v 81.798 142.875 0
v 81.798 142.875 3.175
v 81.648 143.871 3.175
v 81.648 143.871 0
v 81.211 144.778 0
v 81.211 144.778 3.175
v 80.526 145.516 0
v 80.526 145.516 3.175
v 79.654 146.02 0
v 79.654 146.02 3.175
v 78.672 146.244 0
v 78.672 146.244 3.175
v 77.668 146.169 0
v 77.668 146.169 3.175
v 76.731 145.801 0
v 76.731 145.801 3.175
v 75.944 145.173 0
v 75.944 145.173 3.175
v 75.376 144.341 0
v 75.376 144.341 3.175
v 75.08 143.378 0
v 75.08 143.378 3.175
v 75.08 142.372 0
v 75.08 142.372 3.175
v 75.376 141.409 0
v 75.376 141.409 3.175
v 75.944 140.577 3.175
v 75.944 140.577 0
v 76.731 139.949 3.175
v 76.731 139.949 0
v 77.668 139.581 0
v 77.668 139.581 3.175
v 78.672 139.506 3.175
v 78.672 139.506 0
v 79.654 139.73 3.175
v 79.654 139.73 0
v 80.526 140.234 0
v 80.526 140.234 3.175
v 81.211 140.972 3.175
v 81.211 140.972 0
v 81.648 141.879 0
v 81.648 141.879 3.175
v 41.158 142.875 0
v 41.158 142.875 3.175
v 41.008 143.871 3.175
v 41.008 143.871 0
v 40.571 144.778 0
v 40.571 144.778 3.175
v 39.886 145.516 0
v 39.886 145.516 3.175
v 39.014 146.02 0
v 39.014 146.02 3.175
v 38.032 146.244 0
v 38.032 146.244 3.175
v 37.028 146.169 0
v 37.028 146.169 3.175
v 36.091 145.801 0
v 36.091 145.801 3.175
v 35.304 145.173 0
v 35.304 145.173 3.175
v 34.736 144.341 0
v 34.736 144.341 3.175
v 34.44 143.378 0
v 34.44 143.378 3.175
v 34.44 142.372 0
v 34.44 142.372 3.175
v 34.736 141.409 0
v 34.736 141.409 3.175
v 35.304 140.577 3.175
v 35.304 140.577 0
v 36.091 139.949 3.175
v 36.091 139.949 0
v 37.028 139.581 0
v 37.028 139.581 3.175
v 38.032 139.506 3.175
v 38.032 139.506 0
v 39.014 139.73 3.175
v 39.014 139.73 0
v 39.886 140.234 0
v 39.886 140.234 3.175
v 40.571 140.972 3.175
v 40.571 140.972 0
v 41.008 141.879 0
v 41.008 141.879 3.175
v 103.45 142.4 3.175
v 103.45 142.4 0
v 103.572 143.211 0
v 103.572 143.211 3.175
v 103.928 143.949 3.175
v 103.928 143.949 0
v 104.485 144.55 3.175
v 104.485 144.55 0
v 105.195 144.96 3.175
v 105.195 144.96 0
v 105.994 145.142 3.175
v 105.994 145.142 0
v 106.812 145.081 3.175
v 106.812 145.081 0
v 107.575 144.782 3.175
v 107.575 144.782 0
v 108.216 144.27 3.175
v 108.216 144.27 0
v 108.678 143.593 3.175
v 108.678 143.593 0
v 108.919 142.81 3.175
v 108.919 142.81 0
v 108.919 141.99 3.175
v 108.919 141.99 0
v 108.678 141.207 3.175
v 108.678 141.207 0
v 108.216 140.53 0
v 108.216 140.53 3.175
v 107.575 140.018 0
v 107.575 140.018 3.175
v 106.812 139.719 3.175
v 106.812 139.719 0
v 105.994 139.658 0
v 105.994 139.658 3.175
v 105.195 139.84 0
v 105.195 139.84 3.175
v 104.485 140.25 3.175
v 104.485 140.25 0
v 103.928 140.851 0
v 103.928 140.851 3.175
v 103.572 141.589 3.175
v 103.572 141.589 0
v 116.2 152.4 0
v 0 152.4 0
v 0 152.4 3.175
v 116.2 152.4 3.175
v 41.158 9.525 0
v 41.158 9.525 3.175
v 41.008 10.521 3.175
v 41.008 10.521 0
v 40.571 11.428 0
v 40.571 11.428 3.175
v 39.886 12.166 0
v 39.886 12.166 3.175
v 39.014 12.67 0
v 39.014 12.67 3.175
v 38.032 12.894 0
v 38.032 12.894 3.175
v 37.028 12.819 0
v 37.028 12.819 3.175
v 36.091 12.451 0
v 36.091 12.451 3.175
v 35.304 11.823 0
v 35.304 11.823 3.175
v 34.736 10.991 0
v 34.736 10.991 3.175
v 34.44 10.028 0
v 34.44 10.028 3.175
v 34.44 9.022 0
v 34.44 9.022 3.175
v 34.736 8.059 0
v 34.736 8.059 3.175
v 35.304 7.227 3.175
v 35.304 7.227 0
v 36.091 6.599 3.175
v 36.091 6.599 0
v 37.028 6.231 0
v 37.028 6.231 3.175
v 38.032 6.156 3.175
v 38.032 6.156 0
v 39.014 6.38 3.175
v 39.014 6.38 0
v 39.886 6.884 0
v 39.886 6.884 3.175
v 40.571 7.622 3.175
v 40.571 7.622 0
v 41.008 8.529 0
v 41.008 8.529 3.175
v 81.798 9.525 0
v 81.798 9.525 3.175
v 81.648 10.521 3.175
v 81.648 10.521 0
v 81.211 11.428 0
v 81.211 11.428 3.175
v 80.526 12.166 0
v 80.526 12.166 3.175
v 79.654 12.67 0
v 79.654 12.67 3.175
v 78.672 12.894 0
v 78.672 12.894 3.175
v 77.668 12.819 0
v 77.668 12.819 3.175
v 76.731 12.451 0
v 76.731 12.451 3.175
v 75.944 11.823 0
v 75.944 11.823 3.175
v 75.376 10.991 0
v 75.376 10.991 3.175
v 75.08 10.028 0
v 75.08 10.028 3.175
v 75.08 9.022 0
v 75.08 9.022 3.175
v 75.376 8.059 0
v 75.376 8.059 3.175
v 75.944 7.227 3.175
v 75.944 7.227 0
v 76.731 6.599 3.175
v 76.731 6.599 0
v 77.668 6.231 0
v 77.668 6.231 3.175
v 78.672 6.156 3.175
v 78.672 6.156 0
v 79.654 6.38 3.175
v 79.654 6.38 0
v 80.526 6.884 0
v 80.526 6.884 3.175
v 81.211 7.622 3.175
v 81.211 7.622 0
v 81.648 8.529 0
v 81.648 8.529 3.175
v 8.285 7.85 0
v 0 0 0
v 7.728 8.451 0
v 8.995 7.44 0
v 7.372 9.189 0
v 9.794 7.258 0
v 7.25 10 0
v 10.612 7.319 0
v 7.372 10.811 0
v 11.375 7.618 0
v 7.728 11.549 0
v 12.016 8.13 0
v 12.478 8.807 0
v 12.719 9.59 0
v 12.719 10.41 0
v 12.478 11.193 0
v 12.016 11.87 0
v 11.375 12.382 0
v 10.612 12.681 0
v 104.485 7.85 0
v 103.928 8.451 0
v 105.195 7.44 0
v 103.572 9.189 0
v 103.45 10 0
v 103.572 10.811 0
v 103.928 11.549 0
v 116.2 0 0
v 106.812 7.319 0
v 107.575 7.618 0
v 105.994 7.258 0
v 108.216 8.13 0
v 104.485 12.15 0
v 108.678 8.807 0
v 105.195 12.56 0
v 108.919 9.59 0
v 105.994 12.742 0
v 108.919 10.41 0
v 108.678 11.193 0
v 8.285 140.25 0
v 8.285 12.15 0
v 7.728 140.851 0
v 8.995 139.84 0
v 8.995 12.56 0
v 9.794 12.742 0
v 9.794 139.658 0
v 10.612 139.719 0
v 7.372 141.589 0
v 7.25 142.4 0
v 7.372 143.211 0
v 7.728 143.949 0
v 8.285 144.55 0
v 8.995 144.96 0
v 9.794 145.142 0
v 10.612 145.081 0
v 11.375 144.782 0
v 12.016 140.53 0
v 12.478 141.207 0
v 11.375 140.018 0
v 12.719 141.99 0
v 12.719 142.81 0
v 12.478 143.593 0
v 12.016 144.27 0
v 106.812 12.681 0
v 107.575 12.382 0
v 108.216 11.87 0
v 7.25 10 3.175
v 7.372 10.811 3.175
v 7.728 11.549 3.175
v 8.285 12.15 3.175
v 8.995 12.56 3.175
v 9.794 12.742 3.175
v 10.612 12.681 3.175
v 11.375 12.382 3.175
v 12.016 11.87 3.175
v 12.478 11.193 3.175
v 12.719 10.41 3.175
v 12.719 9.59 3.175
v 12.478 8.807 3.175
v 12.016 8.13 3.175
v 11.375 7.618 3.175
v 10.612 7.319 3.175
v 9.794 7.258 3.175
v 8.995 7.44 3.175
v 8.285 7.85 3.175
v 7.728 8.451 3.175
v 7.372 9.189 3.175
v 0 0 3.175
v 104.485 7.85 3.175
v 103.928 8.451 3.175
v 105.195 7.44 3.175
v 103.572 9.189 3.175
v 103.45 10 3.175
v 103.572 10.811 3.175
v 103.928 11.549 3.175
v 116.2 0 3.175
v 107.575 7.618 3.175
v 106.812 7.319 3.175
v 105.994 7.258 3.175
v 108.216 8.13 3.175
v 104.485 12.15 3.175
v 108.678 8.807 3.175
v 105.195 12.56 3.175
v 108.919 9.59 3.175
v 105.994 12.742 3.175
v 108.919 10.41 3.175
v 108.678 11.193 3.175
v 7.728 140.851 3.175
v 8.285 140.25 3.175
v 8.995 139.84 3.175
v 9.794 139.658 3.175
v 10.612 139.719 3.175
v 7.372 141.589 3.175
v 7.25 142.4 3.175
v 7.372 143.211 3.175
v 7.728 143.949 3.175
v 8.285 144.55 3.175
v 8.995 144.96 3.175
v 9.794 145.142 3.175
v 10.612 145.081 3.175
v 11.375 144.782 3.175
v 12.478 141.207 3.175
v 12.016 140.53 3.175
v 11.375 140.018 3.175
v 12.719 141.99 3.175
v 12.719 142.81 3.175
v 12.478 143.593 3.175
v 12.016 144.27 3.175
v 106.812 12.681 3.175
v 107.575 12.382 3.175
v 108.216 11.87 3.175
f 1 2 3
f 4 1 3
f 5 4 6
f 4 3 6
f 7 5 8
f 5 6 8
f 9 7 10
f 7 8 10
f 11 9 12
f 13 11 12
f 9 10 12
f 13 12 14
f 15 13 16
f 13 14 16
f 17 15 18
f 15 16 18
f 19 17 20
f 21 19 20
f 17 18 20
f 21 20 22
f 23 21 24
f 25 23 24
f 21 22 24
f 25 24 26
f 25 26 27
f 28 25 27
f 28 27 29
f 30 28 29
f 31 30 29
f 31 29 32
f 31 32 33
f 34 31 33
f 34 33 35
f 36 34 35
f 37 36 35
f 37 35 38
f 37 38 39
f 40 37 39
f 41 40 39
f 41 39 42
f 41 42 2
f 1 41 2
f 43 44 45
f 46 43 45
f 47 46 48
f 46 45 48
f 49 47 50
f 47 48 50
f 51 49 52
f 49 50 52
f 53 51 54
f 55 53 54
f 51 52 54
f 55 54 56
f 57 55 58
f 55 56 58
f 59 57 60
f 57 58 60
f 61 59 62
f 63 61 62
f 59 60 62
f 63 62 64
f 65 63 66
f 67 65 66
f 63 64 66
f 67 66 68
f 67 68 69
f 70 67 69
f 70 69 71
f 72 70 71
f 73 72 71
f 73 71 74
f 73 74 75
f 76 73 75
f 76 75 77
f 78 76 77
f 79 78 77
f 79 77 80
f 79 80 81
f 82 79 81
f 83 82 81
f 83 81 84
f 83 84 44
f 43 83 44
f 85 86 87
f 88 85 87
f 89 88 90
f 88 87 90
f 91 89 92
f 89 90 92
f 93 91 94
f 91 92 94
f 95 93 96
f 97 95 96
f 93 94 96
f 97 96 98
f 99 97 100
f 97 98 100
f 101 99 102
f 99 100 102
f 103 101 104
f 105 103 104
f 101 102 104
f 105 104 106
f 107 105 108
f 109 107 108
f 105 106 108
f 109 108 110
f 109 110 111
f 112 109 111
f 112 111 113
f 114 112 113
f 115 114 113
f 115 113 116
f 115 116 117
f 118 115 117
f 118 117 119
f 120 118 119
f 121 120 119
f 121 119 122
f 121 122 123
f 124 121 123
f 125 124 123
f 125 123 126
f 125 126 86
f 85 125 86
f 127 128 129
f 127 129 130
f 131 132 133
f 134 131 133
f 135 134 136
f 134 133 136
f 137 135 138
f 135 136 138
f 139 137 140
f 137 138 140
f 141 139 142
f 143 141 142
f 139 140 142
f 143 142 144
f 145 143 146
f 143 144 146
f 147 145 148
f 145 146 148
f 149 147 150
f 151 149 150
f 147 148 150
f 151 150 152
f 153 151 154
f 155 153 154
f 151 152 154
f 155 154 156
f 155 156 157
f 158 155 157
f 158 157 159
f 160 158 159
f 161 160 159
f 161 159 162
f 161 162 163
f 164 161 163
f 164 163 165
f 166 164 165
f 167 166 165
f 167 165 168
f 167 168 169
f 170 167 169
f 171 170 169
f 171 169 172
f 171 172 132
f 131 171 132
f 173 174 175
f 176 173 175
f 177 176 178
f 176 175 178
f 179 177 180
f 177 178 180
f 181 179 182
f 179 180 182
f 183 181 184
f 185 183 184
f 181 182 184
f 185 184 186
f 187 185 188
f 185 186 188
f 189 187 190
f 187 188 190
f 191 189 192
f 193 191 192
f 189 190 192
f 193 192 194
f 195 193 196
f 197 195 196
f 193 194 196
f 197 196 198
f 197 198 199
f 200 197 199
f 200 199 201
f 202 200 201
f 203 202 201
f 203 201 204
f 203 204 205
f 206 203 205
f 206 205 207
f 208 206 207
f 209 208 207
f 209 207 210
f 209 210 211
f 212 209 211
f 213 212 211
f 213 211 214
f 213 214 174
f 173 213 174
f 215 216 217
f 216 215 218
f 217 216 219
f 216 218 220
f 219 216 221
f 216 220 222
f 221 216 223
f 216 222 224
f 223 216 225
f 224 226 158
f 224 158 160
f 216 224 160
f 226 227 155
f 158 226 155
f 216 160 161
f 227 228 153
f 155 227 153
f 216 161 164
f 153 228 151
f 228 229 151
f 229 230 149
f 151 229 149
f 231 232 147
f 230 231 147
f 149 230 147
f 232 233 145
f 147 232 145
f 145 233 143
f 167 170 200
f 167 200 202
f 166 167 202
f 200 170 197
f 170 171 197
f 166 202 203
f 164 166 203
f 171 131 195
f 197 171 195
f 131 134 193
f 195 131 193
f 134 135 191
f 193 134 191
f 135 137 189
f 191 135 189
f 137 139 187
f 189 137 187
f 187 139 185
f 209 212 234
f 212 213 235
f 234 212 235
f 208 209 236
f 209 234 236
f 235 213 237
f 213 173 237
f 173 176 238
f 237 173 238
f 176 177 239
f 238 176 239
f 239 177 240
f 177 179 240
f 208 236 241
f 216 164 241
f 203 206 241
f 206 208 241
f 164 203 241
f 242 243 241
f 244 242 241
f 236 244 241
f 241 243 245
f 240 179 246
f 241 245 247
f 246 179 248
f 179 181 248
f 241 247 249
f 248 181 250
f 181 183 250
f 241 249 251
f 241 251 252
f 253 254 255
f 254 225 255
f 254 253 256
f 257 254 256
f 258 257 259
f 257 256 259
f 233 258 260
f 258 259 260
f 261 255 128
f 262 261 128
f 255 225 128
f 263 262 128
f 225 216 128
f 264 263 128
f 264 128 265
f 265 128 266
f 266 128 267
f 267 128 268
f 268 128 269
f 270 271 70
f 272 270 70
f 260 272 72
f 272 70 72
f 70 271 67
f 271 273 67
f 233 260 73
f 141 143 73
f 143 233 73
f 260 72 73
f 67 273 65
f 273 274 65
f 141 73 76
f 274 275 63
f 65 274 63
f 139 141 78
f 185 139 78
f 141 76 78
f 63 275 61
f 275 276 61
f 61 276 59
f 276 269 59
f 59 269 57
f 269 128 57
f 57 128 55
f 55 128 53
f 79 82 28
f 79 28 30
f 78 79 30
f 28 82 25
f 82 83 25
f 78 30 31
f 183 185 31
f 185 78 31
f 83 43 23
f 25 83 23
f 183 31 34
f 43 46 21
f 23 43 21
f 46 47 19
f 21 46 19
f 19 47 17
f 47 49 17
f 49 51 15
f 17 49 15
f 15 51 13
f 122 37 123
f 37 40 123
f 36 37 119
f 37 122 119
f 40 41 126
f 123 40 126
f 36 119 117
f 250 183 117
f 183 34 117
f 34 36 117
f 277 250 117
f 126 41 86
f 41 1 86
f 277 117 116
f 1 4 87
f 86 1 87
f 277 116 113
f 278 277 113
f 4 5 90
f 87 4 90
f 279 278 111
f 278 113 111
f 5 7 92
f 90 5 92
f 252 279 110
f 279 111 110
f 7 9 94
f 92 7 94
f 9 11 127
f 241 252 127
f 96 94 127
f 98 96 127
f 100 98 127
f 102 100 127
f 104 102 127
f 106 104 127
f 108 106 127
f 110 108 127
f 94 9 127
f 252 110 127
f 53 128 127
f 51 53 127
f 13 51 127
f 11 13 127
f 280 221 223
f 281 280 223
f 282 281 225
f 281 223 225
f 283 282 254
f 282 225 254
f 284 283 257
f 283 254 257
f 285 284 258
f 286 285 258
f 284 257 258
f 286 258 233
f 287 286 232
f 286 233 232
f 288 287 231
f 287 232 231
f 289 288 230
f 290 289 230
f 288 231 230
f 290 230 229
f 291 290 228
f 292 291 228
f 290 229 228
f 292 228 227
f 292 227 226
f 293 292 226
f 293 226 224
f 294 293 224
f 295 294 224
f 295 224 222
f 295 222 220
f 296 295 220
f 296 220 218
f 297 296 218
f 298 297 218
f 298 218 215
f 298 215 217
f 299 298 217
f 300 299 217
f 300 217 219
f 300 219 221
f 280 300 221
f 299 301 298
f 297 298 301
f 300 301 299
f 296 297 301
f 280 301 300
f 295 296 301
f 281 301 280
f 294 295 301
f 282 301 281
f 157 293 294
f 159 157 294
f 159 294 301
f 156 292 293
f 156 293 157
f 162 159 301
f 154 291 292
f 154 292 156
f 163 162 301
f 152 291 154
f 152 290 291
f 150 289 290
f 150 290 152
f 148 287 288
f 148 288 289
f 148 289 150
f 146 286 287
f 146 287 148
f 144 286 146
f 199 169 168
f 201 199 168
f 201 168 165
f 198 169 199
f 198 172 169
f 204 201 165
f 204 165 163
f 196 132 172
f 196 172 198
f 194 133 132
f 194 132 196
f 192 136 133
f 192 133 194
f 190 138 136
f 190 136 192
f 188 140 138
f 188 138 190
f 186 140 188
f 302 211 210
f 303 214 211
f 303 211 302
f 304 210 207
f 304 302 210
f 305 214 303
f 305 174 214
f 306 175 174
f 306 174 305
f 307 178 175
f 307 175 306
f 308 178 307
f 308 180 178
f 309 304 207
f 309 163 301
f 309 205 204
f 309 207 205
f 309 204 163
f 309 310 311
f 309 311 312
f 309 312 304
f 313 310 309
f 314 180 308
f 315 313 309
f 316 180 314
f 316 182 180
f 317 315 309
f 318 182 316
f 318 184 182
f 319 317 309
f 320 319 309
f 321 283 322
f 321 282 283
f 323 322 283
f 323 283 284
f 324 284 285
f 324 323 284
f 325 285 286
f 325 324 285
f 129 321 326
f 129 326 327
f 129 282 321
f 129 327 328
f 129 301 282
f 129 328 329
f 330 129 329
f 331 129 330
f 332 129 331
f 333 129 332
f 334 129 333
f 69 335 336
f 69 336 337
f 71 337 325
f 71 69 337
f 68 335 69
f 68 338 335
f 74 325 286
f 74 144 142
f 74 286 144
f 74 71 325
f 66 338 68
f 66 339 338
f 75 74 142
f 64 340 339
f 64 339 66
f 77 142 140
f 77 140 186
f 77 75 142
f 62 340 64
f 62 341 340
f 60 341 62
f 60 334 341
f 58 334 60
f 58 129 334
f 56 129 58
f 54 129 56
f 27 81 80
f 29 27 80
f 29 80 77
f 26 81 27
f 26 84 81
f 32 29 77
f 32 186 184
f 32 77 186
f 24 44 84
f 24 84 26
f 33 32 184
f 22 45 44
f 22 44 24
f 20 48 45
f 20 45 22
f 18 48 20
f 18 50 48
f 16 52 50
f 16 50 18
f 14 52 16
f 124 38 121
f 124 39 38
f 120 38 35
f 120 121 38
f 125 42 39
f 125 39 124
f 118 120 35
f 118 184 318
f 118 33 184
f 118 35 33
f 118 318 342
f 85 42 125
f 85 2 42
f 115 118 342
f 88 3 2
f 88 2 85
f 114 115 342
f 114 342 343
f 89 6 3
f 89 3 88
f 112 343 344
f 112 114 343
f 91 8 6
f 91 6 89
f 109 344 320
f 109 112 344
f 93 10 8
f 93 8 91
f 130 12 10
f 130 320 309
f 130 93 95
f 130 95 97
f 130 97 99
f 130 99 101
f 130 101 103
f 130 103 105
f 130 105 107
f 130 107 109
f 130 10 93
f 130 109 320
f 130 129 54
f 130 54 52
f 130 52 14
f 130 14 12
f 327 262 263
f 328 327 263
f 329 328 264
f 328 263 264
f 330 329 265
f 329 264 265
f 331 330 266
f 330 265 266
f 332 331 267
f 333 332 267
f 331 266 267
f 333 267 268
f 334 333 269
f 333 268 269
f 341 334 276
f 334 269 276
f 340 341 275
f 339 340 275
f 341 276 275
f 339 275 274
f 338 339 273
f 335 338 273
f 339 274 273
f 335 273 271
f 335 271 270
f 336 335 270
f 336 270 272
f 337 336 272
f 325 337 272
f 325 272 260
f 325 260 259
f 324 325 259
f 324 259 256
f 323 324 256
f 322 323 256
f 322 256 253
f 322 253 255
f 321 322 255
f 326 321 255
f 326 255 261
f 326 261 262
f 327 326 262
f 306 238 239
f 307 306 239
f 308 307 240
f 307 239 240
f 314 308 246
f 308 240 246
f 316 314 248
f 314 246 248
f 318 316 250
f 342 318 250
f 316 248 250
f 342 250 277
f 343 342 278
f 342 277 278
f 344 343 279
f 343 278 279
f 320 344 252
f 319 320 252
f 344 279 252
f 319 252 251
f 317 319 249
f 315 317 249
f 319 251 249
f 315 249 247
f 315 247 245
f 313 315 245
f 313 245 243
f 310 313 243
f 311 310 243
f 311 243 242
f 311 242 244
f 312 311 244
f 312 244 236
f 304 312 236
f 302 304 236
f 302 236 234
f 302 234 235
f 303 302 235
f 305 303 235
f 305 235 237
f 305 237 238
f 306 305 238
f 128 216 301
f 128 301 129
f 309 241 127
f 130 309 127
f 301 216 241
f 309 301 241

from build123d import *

# Parameters (mm, degrees)
SKETCH1_W               = 116.2
SKETCH1_H               = 152.4
BOSS_EXTRUDE1_DEPTH     = 3.175
M5_CLEARANCE_HOLE1_D    = 5.5
F_1_4_CLEARANCE_HOLE1_D = 6.7564


with BuildPart() as part:
    # Sketch1 → Boss-Extrude1 (new body)
    with BuildSketch(Plane.XY):
        with Locations((58.1, 76.2)):
            Rectangle(SKETCH1_W, SKETCH1_H)
    extrude(amount=BOSS_EXTRUDE1_DEPTH)

    # M5 Clearance Hole1 (through all)
    with Locations(Plane.XY.offset(3.175)):
        with Locations((10, 142.4), (106.2, 142.4), (106.2, 10), (10, 10)):
            Hole(M5_CLEARANCE_HOLE1_D / 2)

    # 1/4 Clearance Hole1 (through all)
    with Locations(Plane(origin=(0, 0, 0), x_dir=(-1, 0, 0), z_dir=(0, 0, -1))):
        with Locations((-78.42, 142.875), (-37.78, 142.875), (-37.78, 9.525), (-78.42, 9.525)):
            Hole(F_1_4_CLEARANCE_HOLE1_D / 2)


solid = part.part
